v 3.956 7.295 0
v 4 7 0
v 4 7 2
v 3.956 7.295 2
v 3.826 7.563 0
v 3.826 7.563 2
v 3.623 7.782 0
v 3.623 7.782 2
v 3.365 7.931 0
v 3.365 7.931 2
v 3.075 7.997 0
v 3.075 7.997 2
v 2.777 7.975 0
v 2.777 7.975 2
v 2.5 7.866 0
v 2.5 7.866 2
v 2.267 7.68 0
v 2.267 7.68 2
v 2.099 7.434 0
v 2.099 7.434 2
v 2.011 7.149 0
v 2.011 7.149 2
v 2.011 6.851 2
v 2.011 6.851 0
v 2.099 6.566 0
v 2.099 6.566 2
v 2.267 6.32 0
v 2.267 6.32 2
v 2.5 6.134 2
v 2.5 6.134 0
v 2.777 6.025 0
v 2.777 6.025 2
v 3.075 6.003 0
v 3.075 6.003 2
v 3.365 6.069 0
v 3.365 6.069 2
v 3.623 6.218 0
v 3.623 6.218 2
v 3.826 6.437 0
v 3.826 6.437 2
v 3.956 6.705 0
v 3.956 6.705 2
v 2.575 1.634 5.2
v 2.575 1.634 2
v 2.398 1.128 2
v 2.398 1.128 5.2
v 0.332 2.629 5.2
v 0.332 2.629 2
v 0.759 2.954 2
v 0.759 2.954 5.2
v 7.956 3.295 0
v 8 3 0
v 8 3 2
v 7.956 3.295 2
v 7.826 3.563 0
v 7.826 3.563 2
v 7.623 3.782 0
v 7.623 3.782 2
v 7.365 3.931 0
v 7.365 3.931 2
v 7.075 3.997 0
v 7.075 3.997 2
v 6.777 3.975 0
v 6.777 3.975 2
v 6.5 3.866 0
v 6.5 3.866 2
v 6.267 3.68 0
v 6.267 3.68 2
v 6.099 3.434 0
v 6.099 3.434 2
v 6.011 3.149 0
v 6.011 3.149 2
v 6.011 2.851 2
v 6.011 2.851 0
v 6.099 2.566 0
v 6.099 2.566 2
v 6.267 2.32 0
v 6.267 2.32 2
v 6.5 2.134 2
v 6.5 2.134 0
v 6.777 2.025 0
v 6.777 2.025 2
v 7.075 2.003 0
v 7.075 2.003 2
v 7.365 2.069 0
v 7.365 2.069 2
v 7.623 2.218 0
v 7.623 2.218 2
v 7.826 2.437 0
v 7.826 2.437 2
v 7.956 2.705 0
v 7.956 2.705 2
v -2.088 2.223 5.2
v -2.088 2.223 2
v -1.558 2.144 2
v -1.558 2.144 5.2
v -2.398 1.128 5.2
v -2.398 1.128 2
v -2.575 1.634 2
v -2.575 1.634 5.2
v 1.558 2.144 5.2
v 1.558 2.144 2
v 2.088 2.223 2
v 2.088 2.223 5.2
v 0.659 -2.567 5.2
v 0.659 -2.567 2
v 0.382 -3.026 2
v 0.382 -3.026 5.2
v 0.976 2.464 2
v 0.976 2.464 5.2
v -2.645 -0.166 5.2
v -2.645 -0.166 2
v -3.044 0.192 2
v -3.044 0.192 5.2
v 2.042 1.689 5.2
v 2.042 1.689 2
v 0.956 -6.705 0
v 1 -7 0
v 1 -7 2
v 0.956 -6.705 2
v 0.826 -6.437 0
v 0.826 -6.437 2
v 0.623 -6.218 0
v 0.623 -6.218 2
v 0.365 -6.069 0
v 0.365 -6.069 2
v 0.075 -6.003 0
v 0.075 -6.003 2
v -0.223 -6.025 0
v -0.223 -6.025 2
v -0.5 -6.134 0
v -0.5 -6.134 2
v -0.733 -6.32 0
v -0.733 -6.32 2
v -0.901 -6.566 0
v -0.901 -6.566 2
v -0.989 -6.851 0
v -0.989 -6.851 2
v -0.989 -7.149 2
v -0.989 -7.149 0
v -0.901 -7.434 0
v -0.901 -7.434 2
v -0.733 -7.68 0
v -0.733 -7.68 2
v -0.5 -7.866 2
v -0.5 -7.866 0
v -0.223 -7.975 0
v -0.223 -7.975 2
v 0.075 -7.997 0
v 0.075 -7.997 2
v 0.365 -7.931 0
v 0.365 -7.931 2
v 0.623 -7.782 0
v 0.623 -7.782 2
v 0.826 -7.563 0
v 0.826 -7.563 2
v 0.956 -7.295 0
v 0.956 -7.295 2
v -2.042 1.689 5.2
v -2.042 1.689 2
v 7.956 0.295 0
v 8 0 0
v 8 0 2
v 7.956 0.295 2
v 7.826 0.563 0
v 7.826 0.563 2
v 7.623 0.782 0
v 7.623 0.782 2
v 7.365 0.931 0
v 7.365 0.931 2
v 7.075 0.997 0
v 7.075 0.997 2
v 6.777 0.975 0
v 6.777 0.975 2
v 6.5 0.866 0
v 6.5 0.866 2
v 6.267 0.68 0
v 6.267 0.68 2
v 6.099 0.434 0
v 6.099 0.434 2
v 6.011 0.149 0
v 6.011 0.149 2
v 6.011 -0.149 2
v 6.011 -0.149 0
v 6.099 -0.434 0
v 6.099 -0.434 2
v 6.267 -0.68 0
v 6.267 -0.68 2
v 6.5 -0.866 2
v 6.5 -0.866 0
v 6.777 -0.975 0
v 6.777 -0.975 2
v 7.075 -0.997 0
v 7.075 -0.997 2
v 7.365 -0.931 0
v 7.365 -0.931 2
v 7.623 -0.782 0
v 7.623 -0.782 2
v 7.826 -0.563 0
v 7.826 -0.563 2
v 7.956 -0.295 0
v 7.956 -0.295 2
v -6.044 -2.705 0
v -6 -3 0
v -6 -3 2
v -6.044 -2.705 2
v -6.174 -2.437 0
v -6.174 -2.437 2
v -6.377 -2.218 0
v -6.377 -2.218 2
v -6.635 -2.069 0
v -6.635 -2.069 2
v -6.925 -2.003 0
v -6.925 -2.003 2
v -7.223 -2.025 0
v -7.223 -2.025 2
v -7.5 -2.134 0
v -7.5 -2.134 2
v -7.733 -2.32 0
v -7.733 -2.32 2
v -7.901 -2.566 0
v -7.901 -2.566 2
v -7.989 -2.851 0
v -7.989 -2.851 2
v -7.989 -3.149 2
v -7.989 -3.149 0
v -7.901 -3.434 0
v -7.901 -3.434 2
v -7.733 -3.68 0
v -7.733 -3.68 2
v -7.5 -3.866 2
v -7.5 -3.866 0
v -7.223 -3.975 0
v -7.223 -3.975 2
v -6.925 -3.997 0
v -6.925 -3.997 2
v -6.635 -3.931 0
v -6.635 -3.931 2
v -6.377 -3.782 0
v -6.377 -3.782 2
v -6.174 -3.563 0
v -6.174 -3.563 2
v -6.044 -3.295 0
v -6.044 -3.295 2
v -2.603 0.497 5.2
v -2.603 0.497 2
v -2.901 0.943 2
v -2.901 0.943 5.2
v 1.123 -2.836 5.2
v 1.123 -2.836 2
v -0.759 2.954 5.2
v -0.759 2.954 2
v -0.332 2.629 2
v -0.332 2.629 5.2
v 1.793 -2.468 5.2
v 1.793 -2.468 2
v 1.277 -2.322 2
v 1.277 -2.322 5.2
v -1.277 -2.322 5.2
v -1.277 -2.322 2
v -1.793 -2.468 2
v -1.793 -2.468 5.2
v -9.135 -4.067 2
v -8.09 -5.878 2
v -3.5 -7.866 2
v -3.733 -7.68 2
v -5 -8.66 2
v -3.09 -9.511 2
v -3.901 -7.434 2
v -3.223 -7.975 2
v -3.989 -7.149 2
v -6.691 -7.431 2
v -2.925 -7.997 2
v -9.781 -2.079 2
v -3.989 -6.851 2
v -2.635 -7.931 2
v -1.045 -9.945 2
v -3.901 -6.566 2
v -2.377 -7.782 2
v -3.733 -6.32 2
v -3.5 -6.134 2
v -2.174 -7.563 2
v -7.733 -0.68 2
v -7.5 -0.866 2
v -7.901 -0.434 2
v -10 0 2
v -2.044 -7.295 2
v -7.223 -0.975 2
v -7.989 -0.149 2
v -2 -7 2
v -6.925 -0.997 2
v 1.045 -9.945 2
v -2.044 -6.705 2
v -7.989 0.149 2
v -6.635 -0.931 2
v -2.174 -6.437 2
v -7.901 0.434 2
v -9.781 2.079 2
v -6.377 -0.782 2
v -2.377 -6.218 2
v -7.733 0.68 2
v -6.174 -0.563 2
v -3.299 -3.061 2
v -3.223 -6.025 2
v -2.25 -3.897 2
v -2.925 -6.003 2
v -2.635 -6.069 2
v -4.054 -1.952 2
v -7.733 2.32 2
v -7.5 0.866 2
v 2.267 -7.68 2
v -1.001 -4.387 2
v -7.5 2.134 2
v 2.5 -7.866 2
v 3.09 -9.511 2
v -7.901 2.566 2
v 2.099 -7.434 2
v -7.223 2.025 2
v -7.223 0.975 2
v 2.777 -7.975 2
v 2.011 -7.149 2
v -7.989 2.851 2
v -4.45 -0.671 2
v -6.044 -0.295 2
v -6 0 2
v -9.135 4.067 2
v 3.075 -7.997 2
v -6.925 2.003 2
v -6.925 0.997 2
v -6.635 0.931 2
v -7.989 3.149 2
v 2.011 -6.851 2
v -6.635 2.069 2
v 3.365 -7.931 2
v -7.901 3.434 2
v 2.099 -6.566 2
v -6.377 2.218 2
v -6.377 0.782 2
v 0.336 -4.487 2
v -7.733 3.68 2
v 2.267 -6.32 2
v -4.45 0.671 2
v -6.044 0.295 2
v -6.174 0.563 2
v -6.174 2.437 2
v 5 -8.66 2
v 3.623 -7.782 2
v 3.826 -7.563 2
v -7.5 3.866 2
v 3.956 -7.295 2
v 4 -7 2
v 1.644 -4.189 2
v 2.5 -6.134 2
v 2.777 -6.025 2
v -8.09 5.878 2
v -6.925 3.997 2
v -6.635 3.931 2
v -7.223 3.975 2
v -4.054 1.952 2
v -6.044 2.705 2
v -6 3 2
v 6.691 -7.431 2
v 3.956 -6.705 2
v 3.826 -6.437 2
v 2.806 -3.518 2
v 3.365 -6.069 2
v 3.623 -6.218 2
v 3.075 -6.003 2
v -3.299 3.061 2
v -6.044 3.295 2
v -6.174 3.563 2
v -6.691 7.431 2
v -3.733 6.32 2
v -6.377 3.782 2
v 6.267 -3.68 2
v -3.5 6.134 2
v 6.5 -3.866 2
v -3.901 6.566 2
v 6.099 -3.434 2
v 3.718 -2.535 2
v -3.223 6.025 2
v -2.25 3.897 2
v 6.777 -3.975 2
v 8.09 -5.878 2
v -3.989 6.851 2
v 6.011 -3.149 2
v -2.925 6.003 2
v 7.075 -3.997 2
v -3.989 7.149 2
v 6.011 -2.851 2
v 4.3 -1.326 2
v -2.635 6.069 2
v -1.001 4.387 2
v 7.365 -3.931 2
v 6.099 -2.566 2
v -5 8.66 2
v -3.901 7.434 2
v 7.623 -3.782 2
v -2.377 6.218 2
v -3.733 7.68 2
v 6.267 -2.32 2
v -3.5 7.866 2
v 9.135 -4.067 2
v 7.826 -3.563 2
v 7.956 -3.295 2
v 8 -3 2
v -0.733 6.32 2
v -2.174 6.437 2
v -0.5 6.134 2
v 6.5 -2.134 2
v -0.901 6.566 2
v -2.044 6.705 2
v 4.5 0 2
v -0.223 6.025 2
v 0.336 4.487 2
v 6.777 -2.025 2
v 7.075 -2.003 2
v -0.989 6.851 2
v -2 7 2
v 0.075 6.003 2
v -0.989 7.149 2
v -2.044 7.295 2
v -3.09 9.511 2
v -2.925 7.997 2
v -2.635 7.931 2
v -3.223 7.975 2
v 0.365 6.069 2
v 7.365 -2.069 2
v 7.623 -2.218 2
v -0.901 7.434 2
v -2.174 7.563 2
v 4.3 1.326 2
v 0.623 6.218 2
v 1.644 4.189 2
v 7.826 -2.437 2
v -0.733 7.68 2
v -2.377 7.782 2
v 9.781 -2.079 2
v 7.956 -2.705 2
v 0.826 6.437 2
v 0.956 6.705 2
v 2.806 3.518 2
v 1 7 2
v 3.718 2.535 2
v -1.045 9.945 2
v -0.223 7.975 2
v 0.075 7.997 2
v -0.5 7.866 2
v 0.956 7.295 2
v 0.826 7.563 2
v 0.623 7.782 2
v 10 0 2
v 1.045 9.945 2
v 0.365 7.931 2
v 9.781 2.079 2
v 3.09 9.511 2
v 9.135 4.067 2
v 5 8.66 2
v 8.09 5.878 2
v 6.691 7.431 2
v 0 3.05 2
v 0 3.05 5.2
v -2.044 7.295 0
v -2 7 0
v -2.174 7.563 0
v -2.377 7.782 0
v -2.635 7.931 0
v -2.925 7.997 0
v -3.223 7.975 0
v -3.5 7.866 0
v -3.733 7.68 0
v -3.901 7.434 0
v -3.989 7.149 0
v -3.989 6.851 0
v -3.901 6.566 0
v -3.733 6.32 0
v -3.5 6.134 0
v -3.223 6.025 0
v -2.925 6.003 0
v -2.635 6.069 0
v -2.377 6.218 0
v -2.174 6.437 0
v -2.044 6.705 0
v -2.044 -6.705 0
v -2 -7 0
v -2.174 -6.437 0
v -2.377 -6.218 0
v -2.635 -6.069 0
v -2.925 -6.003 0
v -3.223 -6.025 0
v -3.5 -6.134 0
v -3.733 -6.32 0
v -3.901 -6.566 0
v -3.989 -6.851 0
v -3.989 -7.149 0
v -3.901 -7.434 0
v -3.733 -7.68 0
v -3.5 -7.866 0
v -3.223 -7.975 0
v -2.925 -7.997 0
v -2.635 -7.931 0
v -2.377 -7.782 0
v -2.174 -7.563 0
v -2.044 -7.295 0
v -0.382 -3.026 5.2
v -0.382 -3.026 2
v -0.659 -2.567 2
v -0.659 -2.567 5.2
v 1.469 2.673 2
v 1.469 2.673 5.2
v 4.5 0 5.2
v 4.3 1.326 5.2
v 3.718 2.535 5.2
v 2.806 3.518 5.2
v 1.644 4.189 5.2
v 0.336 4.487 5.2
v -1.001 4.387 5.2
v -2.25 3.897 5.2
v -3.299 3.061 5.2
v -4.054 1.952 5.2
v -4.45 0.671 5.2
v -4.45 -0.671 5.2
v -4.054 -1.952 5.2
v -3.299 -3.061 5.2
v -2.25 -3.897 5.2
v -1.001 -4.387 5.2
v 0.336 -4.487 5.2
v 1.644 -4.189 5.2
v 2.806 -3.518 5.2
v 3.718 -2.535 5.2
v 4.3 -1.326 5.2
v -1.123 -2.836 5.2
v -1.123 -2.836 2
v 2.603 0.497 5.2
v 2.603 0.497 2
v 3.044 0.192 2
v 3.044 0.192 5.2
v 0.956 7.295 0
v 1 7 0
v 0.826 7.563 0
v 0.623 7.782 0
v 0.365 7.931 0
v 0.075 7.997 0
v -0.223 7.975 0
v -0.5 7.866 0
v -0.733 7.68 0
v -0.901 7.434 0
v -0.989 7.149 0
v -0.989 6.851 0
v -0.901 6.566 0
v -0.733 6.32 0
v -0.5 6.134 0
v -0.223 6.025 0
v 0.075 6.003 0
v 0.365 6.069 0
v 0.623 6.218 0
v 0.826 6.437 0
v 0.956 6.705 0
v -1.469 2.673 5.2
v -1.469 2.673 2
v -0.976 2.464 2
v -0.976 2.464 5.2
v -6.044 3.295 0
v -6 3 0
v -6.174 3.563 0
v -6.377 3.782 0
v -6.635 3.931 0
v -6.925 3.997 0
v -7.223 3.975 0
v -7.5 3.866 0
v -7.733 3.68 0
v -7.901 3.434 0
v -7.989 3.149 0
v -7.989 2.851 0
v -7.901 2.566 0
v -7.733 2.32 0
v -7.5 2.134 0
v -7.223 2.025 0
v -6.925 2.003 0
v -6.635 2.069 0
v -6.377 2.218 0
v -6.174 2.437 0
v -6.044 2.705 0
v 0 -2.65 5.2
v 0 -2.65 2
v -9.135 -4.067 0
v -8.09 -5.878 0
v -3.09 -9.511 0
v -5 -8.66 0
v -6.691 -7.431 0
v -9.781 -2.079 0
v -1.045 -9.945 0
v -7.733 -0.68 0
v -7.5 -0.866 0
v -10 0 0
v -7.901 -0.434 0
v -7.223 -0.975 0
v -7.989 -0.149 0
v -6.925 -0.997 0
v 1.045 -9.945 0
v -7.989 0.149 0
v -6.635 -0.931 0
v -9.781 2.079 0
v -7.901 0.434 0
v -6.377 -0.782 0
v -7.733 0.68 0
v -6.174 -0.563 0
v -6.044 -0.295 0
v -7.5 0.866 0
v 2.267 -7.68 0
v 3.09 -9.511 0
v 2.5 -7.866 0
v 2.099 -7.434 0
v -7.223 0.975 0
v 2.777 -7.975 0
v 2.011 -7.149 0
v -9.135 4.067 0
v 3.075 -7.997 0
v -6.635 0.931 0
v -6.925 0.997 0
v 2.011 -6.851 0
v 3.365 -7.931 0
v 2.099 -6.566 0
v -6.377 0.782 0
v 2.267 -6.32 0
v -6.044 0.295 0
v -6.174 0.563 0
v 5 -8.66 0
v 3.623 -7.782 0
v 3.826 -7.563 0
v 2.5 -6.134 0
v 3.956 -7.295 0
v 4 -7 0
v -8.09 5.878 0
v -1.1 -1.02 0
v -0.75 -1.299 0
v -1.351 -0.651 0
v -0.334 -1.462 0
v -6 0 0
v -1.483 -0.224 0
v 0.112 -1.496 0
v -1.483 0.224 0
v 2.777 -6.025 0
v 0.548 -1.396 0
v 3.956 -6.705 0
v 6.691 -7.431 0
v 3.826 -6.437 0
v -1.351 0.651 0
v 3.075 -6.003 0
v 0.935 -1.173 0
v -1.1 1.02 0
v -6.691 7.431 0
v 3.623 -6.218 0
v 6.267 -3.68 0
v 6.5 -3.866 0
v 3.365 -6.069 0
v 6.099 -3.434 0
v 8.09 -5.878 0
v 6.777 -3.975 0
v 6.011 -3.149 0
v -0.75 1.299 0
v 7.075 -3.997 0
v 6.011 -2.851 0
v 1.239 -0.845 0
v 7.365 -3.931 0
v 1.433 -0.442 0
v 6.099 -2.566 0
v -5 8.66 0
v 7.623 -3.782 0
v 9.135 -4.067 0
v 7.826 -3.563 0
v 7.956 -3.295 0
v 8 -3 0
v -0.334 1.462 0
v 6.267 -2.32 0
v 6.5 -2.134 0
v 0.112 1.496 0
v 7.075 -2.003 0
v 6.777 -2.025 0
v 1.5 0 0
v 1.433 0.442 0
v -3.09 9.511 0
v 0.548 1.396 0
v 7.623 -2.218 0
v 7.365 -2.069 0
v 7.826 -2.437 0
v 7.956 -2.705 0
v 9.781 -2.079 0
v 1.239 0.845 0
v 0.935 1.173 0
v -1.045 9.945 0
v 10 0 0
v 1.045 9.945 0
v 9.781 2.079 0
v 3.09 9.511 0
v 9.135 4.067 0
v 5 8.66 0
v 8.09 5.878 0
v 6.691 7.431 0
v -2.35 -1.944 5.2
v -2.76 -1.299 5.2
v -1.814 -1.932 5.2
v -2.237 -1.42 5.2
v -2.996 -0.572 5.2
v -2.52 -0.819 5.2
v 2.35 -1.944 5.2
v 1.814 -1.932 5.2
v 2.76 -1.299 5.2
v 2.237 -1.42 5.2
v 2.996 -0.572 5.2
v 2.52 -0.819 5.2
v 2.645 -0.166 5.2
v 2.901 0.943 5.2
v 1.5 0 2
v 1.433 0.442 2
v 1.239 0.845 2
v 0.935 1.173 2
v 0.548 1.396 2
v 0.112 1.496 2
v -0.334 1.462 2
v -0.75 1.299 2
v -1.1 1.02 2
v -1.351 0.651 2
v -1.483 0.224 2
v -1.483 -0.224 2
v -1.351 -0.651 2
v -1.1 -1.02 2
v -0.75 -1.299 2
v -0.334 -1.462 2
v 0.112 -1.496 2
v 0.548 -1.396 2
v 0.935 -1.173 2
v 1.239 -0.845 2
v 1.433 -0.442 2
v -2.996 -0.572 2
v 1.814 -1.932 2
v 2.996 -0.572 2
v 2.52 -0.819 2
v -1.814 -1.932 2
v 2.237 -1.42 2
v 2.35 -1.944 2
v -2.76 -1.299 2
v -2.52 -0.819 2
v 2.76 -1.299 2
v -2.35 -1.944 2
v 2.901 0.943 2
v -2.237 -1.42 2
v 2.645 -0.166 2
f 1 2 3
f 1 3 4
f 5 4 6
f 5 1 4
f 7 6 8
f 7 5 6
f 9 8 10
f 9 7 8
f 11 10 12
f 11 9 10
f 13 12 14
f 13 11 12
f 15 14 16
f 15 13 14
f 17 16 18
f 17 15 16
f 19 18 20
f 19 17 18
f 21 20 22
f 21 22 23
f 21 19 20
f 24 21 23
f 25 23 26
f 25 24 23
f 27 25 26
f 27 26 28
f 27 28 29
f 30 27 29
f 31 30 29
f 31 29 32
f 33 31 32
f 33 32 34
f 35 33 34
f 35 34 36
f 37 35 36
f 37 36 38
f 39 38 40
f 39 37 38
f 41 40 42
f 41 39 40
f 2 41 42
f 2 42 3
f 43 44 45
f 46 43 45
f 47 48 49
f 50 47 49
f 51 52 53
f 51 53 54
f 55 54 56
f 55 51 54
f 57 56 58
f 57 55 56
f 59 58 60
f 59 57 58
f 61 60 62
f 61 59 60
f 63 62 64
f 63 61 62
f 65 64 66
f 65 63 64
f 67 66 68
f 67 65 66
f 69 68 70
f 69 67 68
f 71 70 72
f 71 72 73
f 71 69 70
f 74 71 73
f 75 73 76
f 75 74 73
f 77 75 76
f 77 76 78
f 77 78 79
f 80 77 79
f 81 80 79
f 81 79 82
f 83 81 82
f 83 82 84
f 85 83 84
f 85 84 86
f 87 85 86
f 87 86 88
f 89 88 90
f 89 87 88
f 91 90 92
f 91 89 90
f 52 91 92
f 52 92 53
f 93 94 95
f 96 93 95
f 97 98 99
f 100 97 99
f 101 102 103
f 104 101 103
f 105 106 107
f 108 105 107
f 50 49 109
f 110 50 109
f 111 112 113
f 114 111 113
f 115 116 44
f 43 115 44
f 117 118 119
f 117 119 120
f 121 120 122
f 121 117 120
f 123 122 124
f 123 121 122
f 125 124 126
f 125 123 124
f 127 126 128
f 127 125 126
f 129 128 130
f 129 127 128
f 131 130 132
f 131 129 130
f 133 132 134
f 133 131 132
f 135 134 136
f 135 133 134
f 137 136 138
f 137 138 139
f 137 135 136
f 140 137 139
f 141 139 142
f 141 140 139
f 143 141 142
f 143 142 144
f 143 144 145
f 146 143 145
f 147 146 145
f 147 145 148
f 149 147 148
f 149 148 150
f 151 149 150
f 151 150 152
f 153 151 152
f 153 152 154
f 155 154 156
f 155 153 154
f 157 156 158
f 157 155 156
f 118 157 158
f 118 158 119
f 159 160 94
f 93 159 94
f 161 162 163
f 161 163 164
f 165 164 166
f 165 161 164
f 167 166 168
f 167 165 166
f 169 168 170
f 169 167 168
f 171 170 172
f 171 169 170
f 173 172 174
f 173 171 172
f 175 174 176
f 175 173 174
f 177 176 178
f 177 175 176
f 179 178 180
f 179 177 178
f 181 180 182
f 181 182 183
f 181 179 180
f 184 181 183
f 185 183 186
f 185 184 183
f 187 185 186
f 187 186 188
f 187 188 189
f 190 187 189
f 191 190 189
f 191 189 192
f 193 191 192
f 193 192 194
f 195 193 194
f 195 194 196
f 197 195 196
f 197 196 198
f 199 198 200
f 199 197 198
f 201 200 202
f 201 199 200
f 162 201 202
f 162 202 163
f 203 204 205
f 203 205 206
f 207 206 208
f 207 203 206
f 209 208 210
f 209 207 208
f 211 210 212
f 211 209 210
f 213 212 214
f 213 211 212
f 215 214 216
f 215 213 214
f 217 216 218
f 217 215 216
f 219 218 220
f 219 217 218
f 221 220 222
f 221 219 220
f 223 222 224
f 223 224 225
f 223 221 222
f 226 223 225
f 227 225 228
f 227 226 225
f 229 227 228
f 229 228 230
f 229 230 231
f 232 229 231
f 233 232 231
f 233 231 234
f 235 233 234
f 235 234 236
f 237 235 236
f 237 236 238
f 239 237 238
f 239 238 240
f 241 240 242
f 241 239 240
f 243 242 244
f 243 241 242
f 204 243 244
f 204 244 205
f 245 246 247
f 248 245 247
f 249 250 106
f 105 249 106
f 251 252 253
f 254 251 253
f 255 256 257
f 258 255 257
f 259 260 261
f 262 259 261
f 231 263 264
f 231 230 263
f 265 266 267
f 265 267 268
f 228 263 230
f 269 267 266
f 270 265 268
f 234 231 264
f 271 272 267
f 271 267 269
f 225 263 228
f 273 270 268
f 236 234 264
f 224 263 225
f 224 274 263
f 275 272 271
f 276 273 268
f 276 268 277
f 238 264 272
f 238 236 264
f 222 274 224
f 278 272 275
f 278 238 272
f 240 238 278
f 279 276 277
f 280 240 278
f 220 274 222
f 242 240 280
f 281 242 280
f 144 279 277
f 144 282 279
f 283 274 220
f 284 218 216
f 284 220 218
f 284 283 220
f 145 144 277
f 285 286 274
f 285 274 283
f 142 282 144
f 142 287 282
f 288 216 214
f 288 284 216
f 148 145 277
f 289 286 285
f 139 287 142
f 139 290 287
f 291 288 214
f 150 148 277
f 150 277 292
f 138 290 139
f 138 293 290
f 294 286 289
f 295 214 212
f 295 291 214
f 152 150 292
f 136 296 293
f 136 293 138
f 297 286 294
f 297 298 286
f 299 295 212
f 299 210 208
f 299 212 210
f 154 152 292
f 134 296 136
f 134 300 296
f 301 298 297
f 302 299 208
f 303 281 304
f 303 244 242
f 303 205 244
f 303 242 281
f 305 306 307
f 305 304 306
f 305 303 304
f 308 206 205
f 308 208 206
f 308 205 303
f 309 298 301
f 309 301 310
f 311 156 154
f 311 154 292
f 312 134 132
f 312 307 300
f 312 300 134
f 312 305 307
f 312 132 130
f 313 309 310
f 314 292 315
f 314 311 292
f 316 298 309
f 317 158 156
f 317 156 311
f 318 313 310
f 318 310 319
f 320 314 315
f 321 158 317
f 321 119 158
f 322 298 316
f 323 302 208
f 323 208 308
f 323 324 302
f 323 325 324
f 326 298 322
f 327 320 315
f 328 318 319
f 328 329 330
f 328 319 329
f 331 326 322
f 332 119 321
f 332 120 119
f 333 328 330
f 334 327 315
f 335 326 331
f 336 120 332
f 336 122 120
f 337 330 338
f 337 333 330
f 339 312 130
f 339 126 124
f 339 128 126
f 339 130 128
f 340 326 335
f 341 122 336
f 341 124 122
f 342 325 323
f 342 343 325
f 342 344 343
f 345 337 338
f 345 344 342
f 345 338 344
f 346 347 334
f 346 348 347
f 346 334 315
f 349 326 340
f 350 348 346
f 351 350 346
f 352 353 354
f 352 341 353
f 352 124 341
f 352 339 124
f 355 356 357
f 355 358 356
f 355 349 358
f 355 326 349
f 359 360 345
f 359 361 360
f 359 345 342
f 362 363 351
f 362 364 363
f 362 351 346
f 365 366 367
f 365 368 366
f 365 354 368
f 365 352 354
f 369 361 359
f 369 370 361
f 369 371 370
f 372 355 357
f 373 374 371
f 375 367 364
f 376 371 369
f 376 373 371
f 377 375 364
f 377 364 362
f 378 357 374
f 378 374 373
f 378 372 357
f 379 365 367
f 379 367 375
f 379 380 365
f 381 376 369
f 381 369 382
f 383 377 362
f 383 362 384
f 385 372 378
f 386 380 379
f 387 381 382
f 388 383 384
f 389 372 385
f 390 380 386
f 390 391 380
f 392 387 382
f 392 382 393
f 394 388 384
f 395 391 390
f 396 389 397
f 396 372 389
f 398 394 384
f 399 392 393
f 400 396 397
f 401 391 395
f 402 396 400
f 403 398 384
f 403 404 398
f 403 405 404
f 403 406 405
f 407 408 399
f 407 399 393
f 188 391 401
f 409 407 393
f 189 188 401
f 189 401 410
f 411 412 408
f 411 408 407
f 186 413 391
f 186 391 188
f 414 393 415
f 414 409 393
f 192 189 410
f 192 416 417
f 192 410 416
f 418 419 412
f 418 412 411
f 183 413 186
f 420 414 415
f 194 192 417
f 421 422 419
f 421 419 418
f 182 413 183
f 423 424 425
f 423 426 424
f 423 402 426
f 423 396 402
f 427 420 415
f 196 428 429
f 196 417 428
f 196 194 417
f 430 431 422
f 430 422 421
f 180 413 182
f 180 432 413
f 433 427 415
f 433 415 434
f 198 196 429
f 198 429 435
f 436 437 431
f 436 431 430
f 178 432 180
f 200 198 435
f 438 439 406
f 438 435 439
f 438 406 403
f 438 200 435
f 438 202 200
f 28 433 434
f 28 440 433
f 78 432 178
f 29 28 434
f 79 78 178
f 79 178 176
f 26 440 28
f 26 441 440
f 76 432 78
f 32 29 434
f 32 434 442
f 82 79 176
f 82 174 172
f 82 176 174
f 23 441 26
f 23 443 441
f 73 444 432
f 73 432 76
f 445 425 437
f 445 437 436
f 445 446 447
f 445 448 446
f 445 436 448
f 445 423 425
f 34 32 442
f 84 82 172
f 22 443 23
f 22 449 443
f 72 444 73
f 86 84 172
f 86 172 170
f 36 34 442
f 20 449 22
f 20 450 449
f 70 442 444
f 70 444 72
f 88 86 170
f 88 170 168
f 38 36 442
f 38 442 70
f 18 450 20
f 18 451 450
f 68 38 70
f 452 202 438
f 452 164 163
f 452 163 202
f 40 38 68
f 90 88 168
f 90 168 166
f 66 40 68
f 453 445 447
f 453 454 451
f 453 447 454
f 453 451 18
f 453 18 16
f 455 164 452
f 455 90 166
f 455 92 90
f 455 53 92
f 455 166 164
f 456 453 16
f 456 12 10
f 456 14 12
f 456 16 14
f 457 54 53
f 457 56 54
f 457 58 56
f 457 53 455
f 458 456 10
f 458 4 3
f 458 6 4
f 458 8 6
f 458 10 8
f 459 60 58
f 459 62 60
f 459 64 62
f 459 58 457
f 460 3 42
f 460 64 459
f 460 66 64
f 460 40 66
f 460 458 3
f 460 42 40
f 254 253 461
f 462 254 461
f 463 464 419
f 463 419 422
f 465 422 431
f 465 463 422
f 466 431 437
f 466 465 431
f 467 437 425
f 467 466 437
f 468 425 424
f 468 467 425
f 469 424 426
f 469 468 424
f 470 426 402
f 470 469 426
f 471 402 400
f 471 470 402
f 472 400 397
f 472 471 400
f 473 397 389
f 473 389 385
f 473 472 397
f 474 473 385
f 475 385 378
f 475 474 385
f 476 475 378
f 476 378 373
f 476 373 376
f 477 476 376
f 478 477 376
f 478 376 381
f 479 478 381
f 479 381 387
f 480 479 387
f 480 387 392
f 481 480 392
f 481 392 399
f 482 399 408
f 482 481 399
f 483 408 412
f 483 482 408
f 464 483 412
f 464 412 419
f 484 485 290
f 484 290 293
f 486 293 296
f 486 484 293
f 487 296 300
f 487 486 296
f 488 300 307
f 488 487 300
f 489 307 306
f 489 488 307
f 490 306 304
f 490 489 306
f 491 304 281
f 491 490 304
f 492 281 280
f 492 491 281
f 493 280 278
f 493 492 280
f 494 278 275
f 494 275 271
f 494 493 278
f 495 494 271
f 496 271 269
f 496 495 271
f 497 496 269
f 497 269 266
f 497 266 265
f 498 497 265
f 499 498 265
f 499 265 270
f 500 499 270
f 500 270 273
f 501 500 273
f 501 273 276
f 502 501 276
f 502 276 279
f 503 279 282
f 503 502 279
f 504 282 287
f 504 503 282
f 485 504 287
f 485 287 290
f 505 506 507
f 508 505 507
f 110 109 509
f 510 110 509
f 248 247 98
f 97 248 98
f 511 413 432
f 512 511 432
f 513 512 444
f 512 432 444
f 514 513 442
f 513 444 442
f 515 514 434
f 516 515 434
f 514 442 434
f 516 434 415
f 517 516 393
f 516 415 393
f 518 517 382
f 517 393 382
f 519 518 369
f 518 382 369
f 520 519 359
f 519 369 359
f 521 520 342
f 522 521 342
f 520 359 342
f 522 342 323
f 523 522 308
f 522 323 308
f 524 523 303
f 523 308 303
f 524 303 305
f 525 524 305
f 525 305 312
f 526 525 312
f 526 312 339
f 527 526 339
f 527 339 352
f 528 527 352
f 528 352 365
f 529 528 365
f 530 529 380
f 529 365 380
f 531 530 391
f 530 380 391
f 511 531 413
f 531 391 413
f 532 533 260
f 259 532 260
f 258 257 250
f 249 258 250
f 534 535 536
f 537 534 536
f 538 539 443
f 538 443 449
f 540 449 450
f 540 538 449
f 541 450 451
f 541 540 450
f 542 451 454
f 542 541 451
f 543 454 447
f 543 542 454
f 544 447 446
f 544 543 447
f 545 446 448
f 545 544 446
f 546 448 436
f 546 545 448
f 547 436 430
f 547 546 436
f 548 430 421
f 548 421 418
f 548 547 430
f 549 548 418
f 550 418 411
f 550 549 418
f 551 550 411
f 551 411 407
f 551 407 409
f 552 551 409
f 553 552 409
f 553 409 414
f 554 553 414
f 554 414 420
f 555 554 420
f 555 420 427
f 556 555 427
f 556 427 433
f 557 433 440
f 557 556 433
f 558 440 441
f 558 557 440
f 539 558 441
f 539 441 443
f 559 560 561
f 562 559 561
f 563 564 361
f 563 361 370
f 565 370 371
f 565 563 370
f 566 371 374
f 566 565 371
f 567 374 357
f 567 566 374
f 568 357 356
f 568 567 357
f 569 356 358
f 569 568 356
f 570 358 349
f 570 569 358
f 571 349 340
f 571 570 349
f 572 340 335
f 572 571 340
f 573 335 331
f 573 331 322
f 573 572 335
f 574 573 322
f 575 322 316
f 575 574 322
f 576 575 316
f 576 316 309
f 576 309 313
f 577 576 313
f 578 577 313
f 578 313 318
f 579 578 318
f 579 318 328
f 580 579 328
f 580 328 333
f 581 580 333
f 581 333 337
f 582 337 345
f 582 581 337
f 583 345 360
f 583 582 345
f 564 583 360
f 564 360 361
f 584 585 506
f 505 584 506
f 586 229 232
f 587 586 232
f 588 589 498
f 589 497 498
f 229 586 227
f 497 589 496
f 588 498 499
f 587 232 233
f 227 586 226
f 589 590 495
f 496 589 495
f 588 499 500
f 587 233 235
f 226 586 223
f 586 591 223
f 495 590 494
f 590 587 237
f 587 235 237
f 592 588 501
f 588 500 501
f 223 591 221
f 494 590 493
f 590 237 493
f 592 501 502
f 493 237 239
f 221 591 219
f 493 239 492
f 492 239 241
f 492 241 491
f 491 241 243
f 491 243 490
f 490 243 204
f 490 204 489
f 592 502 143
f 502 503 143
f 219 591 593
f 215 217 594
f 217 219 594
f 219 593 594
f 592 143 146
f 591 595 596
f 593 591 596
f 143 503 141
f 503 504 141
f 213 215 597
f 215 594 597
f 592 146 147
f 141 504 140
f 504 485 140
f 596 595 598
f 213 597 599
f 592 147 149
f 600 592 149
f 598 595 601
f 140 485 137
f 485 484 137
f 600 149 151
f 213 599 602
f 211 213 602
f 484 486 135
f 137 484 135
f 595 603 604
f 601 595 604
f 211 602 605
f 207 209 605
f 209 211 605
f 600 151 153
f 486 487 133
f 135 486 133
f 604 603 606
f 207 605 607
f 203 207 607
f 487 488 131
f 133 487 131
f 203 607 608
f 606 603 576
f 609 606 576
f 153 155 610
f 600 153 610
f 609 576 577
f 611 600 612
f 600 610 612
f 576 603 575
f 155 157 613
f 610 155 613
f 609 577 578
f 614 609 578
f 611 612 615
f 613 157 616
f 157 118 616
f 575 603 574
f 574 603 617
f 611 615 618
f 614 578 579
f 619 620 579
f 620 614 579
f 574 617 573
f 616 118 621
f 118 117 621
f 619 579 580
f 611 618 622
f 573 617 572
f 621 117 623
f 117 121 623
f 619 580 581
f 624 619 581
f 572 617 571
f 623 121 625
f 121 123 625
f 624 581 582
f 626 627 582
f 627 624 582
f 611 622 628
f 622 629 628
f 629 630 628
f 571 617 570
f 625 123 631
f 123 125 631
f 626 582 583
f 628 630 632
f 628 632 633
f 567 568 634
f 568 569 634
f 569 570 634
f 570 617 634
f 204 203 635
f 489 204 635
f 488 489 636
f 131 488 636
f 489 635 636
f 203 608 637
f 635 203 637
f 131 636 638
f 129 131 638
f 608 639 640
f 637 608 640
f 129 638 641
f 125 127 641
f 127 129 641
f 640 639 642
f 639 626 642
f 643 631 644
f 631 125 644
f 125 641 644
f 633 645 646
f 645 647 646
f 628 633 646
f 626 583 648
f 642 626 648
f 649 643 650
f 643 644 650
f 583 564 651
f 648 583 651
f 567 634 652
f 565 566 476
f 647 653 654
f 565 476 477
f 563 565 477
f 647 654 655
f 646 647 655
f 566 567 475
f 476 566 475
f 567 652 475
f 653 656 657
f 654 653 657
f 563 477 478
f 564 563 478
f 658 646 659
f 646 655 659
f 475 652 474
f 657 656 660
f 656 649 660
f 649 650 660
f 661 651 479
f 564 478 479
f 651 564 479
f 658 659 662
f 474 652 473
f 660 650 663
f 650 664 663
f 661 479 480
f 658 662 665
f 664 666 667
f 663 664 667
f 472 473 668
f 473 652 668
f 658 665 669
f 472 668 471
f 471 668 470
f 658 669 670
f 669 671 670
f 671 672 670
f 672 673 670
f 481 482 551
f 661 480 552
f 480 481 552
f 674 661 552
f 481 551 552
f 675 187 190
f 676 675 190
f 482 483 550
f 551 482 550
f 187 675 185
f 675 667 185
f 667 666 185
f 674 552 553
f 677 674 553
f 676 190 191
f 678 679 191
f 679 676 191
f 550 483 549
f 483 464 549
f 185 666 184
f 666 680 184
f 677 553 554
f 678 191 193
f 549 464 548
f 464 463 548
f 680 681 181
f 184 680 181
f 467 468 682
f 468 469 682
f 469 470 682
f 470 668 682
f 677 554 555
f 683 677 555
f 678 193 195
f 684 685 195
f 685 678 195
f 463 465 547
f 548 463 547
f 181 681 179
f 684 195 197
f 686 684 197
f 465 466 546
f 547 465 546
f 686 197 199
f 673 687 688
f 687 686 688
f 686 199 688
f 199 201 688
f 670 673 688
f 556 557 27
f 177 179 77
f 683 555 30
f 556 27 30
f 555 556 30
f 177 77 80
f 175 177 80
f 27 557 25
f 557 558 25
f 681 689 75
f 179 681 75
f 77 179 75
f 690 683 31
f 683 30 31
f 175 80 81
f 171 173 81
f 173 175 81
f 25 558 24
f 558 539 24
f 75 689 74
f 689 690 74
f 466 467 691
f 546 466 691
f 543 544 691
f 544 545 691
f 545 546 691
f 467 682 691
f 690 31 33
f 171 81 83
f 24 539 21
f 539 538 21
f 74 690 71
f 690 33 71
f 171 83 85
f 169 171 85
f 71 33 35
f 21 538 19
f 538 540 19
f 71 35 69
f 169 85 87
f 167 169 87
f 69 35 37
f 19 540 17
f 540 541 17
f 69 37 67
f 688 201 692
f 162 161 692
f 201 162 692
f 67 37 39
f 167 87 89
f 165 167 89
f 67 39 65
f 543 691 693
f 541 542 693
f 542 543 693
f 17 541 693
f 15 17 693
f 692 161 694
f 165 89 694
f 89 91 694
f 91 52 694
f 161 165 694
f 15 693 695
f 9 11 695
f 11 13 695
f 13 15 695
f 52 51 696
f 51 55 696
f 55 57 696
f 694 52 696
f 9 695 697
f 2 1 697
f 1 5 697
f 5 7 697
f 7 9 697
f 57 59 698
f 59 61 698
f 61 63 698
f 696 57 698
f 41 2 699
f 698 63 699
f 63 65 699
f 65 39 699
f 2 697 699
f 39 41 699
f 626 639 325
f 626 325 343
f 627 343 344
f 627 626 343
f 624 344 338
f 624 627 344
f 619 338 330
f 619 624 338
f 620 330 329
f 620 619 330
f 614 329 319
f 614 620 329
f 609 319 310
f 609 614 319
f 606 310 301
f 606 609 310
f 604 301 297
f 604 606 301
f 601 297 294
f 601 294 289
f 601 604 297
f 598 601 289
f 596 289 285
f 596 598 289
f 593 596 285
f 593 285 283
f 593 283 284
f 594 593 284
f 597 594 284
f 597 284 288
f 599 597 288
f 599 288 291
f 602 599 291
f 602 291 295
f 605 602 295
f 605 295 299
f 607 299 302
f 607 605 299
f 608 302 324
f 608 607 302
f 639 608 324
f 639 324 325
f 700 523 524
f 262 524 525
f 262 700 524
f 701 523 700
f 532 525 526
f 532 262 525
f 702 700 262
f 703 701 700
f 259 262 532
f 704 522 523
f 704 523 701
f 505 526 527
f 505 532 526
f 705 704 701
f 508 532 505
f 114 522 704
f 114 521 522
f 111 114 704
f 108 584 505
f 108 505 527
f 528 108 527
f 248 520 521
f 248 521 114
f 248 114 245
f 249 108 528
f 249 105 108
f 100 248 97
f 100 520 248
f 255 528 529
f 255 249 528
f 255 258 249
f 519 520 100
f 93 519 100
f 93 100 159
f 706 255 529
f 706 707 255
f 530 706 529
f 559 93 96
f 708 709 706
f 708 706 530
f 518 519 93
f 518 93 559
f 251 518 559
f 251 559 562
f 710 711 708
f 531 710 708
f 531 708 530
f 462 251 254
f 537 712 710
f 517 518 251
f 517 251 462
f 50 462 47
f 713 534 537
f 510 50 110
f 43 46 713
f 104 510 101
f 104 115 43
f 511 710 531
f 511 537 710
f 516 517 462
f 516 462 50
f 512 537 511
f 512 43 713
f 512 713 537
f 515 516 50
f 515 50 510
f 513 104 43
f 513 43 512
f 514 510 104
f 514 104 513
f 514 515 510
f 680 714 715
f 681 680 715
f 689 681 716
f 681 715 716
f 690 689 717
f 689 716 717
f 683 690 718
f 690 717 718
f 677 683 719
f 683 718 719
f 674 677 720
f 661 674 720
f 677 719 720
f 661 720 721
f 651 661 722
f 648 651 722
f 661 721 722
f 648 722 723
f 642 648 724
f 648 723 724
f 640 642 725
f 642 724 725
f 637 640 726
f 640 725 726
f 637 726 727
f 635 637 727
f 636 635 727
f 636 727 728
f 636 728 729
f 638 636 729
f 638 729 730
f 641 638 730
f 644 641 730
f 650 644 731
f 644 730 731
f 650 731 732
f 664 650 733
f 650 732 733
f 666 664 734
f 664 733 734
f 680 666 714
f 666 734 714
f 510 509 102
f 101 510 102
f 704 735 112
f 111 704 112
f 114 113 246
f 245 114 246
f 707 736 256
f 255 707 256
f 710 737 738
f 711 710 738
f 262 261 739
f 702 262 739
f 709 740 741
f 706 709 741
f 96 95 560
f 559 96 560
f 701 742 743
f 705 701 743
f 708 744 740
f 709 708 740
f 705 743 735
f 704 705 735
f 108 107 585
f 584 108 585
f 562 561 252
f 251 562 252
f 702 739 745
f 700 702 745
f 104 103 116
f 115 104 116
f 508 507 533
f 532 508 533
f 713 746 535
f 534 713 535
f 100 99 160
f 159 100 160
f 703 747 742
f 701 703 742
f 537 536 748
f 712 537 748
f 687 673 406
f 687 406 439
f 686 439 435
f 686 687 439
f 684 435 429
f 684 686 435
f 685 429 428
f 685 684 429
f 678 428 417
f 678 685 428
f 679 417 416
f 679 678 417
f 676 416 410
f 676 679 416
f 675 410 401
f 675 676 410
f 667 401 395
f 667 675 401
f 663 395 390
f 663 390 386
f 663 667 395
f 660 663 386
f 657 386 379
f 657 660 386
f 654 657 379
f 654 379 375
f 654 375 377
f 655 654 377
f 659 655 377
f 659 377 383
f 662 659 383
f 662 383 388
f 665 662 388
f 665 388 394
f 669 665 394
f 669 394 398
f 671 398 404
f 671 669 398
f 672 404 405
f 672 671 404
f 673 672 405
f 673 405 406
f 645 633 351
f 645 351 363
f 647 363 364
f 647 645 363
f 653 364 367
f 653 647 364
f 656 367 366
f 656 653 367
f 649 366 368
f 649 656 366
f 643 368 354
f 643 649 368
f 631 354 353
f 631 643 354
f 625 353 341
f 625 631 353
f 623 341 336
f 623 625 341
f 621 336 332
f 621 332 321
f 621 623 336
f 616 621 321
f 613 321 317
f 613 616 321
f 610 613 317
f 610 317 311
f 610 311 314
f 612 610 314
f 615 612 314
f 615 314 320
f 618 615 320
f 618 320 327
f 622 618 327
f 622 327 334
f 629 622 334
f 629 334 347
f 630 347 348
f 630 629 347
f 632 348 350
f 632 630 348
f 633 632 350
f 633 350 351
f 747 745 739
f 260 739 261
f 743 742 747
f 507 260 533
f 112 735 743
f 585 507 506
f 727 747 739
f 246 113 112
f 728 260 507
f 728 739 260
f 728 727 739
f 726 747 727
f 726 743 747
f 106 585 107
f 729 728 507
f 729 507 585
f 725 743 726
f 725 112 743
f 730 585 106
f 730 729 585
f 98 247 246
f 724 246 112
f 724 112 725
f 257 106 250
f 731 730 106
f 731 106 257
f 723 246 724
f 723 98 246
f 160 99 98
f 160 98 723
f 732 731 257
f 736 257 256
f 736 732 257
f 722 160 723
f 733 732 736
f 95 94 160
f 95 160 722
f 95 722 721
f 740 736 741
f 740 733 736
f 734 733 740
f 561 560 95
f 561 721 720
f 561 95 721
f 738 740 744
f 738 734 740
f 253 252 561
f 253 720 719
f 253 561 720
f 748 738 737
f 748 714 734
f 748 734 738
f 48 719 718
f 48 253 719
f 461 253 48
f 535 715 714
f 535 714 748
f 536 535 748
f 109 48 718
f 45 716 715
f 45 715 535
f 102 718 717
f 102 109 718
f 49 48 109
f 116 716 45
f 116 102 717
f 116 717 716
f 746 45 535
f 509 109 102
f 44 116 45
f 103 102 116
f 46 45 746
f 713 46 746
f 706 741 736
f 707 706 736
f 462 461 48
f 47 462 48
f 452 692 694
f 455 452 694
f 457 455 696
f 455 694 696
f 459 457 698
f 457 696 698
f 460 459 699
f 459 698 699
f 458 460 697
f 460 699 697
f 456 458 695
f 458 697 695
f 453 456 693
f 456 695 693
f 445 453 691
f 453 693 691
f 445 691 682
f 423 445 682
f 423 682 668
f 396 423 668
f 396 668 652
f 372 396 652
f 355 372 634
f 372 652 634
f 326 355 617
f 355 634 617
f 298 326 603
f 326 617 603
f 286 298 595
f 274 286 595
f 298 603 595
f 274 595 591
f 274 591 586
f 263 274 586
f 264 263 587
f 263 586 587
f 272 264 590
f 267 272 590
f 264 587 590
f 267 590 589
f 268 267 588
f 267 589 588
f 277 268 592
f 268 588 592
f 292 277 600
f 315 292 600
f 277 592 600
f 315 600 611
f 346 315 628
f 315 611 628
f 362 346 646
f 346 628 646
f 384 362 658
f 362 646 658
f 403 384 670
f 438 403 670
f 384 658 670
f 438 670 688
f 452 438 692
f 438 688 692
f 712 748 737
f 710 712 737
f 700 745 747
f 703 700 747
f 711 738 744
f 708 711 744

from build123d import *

# Parameters (mm, degrees)
SKETCH1_R           = 10
SKETCH1_R_2         = 1
BOSS_EXTRUDE1_DEPTH = 2
SKETCH2_R           = 4.5
BOSS_EXTRUDE2_DEPTH = 3.2
SKETCH4_R           = 1.5
CUT_EXTRUDE1_DEPTH  = 2


with BuildPart() as part:
    # Sketch1 → Boss-Extrude1 (new body)
    with BuildSketch(Plane.XY):
        Circle(SKETCH1_R)
        with Locations((0, 7)):
            Circle(SKETCH1_R_2, mode=Mode.SUBTRACT)
        with Locations((-3, 7)):
            Circle(SKETCH1_R_2, mode=Mode.SUBTRACT)
        with Locations((3, 7)):
            Circle(SKETCH1_R_2, mode=Mode.SUBTRACT)
        with Locations((7, 0)):
            Circle(SKETCH1_R_2, mode=Mode.SUBTRACT)
        with Locations((7, -3)):
            Circle(SKETCH1_R_2, mode=Mode.SUBTRACT)
        with Locations((7, 3)):
            Circle(SKETCH1_R_2, mode=Mode.SUBTRACT)
        with Locations((0, -7)):
            Circle(SKETCH1_R_2, mode=Mode.SUBTRACT)
        with Locations((-3, -7)):
            Circle(SKETCH1_R_2, mode=Mode.SUBTRACT)
        with Locations((3, -7)):
            Circle(SKETCH1_R_2, mode=Mode.SUBTRACT)
        with Locations((-7, 0)):
            Circle(SKETCH1_R_2, mode=Mode.SUBTRACT)
        with Locations((-7, 3)):
            Circle(SKETCH1_R_2, mode=Mode.SUBTRACT)
        with Locations((-7, -3)):
            Circle(SKETCH1_R_2, mode=Mode.SUBTRACT)
    extrude(amount=BOSS_EXTRUDE1_DEPTH)

    # Sketch2 → Boss-Extrude2 (add)
    with BuildSketch(Plane.XY.offset(2)):
        Circle(SKETCH2_R)
        Polygon((0.758504156, 2.954178641), (0.975530065, 2.463907688), (1.469348706, 2.672735374), (1.557630919, 2.143895035), (2.087868673, 2.223354314), (2.041860093, 1.689173573), (2.575200173, 1.634271725), (2.397791689, 1.128315123), (2.900722375, 0.942501833), (2.603061214, 0.496560484), (3.043981522, 0.191511085), (2.64477083, -0.166394877), (2.995976115, -0.571513009), (2.520299768, -0.818895035), (2.75972251, -1.298626839), (2.237469003, -1.419941007), (2.35006539, -1.944143169), (1.814049831, -1.931766863), (1.792745019, -2.467501833), (1.276647236, -2.322212702), (1.122779886, -2.835818282), (0.659028201, -2.566745377), (0.382266362, -3.025949839), (0, -2.65), (-0.382266362, -3.025949839), (-0.659028201, -2.566745377), (-1.122779886, -2.835818282), (-1.276647236, -2.322212702), (-1.792745019, -2.467501833), (-1.814049831, -1.931766863), (-2.35006539, -1.944143169), (-2.237469003, -1.419941007), (-2.75972251, -1.298626839), (-2.520299768, -0.818895035), (-2.995976115, -0.571513009), (-2.64477083, -0.166394877), (-3.043981522, 0.191511085), (-2.603061214, 0.496560484), (-2.900722375, 0.942501833), (-2.397791689, 1.128315123), (-2.575200173, 1.634271725), (-2.041860093, 1.689173573), (-2.087868673, 2.223354314), (-1.557630919, 2.143895035), (-1.469348706, 2.672735374), (-0.975530065, 2.463907688), (-0.758504156, 2.954178641), (-0.332133069, 2.629103958), (0, 3.05), (0.332133069, 2.629103958), align=None, mode=Mode.SUBTRACT)
    extrude(amount=BOSS_EXTRUDE2_DEPTH)

    # Sketch4 → Cut-Extrude1 (cut)
    with BuildSketch(Plane.XY.offset(2)):
        Circle(SKETCH4_R)
    extrude(amount=-CUT_EXTRUDE1_DEPTH, mode=Mode.SUBTRACT)


solid = part.part
